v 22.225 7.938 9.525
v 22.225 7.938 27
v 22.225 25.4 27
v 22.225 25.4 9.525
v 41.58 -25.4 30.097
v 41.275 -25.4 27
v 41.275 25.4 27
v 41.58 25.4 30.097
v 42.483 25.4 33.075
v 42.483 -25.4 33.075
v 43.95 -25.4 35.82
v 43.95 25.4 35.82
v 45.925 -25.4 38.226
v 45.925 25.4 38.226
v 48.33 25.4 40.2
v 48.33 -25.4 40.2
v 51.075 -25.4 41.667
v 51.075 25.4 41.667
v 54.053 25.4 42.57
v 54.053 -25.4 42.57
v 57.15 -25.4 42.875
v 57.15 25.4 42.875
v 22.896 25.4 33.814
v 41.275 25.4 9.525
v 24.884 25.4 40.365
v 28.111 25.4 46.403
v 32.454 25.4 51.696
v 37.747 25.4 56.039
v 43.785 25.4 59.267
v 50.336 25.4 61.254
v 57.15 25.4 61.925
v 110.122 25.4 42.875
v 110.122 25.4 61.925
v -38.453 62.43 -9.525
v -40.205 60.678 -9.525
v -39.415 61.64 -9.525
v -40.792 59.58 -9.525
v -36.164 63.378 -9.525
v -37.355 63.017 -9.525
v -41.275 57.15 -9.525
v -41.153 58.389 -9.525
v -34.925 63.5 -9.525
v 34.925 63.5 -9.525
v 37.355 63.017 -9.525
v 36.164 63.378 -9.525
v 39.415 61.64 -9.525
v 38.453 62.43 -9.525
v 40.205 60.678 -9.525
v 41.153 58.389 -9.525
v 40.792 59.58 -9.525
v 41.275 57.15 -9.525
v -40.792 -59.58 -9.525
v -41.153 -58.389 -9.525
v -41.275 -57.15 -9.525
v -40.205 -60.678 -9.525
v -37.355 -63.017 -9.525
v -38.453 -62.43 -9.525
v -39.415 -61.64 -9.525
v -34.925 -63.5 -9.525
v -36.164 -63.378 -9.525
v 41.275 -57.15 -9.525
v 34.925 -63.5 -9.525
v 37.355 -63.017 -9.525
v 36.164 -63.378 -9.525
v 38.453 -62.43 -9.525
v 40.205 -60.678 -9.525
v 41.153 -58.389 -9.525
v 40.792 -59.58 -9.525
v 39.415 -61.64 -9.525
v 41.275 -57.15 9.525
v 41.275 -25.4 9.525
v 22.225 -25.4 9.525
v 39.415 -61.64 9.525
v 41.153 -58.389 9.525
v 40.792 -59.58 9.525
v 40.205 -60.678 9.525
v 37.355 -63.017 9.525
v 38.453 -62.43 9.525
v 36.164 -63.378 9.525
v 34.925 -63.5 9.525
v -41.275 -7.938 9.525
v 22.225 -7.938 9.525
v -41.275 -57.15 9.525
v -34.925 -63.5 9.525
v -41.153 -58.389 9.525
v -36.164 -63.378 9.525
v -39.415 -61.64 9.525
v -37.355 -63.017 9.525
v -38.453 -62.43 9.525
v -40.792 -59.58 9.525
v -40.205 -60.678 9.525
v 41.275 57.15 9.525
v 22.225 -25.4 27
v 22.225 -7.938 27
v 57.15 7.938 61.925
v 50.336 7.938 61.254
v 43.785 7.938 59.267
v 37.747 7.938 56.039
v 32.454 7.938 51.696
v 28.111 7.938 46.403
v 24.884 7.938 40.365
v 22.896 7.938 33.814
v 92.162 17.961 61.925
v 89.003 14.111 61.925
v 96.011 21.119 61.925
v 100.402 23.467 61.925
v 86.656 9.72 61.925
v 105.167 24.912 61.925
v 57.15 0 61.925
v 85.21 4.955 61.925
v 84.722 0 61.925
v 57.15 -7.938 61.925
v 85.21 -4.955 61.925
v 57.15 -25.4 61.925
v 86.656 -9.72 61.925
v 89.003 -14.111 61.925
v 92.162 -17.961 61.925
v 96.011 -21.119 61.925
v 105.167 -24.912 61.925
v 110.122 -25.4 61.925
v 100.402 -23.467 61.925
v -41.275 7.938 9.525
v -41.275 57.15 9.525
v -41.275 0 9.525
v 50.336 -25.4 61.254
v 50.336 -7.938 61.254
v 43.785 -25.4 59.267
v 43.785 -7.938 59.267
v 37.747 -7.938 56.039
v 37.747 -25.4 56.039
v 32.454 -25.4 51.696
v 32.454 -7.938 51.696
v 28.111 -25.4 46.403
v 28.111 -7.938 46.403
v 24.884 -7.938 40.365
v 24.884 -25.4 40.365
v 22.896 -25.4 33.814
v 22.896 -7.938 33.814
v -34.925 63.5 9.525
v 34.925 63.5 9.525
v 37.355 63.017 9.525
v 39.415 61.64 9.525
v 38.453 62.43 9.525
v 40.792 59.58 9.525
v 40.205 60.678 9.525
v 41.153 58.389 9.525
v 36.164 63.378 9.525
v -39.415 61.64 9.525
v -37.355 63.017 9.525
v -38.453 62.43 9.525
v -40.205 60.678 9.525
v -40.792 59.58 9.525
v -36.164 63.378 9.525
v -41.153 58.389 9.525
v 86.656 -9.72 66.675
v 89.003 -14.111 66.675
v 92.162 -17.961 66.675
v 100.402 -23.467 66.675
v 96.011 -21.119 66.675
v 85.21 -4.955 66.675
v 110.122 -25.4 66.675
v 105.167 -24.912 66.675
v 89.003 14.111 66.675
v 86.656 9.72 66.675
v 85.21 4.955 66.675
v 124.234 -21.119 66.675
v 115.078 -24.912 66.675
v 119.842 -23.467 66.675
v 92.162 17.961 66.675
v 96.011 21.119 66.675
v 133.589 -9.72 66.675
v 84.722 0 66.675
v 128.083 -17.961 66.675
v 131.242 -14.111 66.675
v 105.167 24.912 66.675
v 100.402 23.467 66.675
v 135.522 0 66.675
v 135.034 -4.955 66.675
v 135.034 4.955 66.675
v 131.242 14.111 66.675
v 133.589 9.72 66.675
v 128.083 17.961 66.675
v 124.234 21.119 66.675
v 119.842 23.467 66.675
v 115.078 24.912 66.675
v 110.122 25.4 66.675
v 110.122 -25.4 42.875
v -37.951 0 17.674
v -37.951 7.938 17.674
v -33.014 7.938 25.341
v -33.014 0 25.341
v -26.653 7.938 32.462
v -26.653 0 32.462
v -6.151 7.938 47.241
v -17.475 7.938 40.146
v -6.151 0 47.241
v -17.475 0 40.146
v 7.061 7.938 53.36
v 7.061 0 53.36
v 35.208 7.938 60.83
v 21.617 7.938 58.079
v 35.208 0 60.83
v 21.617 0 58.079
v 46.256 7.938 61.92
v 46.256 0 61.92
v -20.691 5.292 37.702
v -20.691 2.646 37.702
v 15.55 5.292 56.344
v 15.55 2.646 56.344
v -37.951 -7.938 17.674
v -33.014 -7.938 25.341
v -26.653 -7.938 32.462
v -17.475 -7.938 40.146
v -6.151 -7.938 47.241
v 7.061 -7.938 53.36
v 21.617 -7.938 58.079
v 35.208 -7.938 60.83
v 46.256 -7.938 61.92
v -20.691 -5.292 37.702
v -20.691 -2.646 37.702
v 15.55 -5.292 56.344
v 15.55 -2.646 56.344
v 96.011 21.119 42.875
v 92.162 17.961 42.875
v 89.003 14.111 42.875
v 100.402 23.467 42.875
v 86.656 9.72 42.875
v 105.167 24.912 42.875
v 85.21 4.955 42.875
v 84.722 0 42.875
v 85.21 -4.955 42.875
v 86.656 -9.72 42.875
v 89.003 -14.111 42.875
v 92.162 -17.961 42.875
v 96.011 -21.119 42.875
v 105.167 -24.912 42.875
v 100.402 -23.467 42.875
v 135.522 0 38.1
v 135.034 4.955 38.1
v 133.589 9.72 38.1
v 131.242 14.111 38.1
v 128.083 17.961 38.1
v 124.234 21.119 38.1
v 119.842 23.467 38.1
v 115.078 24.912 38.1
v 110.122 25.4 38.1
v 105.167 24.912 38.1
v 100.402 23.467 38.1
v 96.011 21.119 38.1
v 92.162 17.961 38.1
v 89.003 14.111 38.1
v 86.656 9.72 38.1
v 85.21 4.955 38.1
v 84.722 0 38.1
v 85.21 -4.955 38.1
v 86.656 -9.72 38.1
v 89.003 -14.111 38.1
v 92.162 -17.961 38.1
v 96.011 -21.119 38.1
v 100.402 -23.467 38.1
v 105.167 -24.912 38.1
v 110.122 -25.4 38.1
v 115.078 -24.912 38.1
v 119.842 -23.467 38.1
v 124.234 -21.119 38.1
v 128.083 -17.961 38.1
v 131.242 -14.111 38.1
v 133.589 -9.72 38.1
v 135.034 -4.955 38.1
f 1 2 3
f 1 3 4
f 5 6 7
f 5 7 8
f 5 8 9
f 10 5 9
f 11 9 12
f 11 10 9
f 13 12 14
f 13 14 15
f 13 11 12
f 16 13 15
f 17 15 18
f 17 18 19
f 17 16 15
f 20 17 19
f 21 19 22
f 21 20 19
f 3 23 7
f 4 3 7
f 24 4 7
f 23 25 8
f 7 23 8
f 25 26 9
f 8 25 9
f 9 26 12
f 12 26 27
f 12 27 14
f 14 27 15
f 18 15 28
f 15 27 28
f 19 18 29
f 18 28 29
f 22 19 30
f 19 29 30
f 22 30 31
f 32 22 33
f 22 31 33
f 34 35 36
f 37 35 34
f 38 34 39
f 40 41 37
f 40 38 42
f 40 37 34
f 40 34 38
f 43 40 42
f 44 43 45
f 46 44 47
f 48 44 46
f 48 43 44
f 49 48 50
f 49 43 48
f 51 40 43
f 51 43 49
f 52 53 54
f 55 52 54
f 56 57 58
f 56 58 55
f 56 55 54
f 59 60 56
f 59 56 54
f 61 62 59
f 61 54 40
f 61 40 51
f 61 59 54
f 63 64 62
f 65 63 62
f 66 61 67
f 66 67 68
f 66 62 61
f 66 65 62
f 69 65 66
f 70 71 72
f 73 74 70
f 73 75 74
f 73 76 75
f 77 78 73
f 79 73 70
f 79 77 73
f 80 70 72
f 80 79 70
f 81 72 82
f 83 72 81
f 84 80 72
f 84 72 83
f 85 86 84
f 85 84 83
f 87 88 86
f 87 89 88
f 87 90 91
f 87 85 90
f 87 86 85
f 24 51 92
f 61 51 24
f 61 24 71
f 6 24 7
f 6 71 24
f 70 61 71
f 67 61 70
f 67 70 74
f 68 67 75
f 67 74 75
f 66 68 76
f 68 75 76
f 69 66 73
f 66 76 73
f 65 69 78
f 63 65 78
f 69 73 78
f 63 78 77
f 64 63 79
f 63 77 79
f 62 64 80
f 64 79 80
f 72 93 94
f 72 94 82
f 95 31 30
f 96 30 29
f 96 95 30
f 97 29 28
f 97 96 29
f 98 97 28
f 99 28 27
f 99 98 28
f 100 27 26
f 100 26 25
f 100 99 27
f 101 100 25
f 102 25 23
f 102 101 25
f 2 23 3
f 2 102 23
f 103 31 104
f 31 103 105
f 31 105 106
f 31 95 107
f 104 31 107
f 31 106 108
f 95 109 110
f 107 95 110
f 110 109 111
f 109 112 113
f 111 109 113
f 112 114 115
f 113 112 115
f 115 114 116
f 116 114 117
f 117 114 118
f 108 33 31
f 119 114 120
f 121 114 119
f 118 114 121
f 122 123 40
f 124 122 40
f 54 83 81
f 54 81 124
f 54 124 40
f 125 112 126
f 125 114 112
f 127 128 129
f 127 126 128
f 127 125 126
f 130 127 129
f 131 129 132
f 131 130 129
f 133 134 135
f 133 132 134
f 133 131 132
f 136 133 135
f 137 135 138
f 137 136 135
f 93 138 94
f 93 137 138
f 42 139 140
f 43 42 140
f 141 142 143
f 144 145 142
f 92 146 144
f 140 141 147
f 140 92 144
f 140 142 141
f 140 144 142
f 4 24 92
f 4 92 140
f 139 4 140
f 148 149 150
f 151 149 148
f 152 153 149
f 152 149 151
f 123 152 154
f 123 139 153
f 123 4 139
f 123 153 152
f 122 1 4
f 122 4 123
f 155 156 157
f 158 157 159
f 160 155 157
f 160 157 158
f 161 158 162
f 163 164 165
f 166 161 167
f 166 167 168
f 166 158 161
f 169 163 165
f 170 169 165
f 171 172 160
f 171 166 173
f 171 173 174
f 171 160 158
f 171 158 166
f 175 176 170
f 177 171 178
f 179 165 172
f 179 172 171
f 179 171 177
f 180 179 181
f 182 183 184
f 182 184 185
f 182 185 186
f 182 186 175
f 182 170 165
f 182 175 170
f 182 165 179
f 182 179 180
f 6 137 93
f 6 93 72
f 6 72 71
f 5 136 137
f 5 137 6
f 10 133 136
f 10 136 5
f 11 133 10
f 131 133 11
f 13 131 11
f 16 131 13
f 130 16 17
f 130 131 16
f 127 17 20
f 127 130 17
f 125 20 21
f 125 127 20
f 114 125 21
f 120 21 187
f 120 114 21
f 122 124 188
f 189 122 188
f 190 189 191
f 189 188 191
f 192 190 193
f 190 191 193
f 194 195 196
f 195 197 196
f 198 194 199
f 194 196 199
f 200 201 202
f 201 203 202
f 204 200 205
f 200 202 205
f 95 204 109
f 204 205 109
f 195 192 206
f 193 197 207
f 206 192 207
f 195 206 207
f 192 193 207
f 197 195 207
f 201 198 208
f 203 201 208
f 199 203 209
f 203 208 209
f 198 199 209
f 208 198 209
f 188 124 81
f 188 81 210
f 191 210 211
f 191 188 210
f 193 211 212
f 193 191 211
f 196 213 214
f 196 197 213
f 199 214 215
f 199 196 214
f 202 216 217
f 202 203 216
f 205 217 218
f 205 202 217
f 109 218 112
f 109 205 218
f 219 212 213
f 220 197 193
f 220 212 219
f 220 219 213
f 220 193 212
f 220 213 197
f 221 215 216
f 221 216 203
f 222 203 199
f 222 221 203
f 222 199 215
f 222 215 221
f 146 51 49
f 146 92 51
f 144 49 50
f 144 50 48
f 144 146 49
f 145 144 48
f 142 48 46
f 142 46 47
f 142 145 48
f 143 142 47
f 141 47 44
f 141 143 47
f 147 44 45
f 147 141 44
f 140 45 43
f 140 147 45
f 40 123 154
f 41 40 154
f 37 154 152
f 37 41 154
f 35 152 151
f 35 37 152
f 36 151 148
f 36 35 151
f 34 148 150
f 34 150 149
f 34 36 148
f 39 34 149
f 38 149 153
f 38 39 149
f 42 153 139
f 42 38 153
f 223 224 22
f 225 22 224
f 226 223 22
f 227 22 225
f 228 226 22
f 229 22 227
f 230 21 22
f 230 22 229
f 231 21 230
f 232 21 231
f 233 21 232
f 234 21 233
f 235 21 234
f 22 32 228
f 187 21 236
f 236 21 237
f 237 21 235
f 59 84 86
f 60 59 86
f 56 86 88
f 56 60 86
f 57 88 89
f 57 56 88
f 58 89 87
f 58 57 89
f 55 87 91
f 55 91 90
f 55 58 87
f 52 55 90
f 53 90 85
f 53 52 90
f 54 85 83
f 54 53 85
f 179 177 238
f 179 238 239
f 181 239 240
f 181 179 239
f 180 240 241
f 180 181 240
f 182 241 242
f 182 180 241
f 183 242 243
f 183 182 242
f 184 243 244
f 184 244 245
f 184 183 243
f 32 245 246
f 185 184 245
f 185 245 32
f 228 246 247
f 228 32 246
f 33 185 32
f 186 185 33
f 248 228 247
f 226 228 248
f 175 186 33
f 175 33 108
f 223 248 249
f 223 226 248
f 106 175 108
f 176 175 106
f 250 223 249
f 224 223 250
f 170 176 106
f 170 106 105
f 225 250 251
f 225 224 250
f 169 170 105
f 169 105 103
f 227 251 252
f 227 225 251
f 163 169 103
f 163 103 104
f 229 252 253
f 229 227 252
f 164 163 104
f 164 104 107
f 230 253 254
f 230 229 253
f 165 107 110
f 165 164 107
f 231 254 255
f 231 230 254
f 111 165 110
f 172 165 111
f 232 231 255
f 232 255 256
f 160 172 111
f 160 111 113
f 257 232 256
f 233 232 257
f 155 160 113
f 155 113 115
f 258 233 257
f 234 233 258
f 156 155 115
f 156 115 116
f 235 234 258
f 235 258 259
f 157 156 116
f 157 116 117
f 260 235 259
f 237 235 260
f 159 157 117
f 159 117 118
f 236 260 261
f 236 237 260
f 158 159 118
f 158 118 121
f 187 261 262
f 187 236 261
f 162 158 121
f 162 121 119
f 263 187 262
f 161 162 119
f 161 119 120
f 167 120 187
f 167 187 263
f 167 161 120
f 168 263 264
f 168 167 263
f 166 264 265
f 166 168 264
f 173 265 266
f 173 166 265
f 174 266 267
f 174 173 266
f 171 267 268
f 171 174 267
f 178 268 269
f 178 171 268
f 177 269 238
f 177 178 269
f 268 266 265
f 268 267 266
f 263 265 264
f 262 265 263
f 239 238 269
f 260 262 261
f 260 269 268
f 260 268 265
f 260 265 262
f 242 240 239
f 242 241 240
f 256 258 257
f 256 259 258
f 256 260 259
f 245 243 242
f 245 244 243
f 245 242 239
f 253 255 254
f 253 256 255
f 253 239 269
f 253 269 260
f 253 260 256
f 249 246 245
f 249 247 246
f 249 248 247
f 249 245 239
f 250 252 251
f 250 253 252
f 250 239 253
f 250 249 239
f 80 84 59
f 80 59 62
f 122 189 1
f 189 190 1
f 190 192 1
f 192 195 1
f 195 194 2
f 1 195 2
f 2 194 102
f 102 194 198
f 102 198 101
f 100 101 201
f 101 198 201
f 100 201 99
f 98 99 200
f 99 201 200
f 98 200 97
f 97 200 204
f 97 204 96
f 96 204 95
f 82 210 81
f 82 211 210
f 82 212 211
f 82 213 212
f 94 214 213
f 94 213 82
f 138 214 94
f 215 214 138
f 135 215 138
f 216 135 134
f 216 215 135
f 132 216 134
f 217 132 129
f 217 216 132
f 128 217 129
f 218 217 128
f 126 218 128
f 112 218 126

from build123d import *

# Parameters (mm, degrees)
F1_DEPTH = 63.5
F2_DEPTH = 25.4
F3_DEPTH = 7.9375
F0_W     = 25.4
F0_H     = 19.05
F4_DEPTH = 25.4
F6_R     = 6.35


with BuildPart() as f1:
    # F0 (on Front) → F1 (new body, symmetric)
    with BuildSketch(Plane.XZ):
        Polygon((41.275, -9.525), (41.275, 9.525), (22.225, 9.525), (-41.275, 9.525), (-41.275, -9.525), align=None)
    extrude(amount=F1_DEPTH, both=True)

    # F0 (on Front) → F2 (join, symmetric)
    with BuildSketch(Plane.XZ):
        with BuildLine():
            Line((22.225, 9.525), (41.275, 9.525))
            Line((41.275, 9.525), (41.275, 27.0002))
            ThreePointArc((41.275, 27.0002), (45.9246798487, 38.2255201513), (57.15, 42.8752))
            Line((57.15, 42.8752), (84.7223362398, 42.8752))
            Line((84.7223362398, 42.8752), (84.7223362398, 61.9252))
            Line((84.7223362398, 61.9252), (57.15, 61.9252))
            ThreePointArc((57.15, 61.9252), (32.4542956671, 51.6959043329), (22.225, 27.0002))
            Line((22.225, 27.0002), (22.225, 9.525))
        make_face()
    extrude(amount=F2_DEPTH, both=True)

    # F0 (on Front) → F3 (join, symmetric)
    with BuildSketch(Plane.XZ):
        with BuildLine():
            Line((-41.275, 9.525), (22.225, 9.525))
            Line((22.225, 9.525), (22.225, 27.0002))
            ThreePointArc((22.225, 27.0002), (32.4542956671, 51.6959043329), (57.15, 61.9252))
            add(Edge.make_bspline(
                [(-41.275, 9.525), (-31.9519031348, 41.2950287538), (16.3025462672, 64.0494193526), (57.15, 61.9252)],
                knots=[0, 0, 0, 0, 111.5045361635, 111.5045361635, 111.5045361635, 111.5045361635], degree=3))
        make_face()
    extrude(amount=F3_DEPTH, both=True)

    # F0 (on Front) → F4 (join, symmetric)
    with BuildSketch(Plane.XZ):
        with Locations((97.4223362398, 52.4002)):
            Rectangle(F0_W, F0_H)
    extrude(amount=F4_DEPTH, both=True)

    # F0 (on Front) → F5 (revolve)
    with BuildSketch(Plane.XZ):
        Polygon((110.1223362398, 61.9252), (110.1223362398, 42.8752), (110.1223362398, 38.1), (135.5223362398, 38.1), (135.5223362398, 66.675), (110.1223362398, 66.675), align=None)
    revolve(axis=Axis((110.1223362398, 0, 52.3875), (0, 0, 1)))

    # F6
    f6_edges = [f1.edges().sort_by_distance(p)[0] for p in [
        (-41.275, -63.5, 0),
        (41.275, -63.5, 0),
        (41.275, 63.5, 0),
        (-41.275, 63.5, 0),
    ]]
    fillet(f6_edges, radius=F6_R)


solid = f1.part
